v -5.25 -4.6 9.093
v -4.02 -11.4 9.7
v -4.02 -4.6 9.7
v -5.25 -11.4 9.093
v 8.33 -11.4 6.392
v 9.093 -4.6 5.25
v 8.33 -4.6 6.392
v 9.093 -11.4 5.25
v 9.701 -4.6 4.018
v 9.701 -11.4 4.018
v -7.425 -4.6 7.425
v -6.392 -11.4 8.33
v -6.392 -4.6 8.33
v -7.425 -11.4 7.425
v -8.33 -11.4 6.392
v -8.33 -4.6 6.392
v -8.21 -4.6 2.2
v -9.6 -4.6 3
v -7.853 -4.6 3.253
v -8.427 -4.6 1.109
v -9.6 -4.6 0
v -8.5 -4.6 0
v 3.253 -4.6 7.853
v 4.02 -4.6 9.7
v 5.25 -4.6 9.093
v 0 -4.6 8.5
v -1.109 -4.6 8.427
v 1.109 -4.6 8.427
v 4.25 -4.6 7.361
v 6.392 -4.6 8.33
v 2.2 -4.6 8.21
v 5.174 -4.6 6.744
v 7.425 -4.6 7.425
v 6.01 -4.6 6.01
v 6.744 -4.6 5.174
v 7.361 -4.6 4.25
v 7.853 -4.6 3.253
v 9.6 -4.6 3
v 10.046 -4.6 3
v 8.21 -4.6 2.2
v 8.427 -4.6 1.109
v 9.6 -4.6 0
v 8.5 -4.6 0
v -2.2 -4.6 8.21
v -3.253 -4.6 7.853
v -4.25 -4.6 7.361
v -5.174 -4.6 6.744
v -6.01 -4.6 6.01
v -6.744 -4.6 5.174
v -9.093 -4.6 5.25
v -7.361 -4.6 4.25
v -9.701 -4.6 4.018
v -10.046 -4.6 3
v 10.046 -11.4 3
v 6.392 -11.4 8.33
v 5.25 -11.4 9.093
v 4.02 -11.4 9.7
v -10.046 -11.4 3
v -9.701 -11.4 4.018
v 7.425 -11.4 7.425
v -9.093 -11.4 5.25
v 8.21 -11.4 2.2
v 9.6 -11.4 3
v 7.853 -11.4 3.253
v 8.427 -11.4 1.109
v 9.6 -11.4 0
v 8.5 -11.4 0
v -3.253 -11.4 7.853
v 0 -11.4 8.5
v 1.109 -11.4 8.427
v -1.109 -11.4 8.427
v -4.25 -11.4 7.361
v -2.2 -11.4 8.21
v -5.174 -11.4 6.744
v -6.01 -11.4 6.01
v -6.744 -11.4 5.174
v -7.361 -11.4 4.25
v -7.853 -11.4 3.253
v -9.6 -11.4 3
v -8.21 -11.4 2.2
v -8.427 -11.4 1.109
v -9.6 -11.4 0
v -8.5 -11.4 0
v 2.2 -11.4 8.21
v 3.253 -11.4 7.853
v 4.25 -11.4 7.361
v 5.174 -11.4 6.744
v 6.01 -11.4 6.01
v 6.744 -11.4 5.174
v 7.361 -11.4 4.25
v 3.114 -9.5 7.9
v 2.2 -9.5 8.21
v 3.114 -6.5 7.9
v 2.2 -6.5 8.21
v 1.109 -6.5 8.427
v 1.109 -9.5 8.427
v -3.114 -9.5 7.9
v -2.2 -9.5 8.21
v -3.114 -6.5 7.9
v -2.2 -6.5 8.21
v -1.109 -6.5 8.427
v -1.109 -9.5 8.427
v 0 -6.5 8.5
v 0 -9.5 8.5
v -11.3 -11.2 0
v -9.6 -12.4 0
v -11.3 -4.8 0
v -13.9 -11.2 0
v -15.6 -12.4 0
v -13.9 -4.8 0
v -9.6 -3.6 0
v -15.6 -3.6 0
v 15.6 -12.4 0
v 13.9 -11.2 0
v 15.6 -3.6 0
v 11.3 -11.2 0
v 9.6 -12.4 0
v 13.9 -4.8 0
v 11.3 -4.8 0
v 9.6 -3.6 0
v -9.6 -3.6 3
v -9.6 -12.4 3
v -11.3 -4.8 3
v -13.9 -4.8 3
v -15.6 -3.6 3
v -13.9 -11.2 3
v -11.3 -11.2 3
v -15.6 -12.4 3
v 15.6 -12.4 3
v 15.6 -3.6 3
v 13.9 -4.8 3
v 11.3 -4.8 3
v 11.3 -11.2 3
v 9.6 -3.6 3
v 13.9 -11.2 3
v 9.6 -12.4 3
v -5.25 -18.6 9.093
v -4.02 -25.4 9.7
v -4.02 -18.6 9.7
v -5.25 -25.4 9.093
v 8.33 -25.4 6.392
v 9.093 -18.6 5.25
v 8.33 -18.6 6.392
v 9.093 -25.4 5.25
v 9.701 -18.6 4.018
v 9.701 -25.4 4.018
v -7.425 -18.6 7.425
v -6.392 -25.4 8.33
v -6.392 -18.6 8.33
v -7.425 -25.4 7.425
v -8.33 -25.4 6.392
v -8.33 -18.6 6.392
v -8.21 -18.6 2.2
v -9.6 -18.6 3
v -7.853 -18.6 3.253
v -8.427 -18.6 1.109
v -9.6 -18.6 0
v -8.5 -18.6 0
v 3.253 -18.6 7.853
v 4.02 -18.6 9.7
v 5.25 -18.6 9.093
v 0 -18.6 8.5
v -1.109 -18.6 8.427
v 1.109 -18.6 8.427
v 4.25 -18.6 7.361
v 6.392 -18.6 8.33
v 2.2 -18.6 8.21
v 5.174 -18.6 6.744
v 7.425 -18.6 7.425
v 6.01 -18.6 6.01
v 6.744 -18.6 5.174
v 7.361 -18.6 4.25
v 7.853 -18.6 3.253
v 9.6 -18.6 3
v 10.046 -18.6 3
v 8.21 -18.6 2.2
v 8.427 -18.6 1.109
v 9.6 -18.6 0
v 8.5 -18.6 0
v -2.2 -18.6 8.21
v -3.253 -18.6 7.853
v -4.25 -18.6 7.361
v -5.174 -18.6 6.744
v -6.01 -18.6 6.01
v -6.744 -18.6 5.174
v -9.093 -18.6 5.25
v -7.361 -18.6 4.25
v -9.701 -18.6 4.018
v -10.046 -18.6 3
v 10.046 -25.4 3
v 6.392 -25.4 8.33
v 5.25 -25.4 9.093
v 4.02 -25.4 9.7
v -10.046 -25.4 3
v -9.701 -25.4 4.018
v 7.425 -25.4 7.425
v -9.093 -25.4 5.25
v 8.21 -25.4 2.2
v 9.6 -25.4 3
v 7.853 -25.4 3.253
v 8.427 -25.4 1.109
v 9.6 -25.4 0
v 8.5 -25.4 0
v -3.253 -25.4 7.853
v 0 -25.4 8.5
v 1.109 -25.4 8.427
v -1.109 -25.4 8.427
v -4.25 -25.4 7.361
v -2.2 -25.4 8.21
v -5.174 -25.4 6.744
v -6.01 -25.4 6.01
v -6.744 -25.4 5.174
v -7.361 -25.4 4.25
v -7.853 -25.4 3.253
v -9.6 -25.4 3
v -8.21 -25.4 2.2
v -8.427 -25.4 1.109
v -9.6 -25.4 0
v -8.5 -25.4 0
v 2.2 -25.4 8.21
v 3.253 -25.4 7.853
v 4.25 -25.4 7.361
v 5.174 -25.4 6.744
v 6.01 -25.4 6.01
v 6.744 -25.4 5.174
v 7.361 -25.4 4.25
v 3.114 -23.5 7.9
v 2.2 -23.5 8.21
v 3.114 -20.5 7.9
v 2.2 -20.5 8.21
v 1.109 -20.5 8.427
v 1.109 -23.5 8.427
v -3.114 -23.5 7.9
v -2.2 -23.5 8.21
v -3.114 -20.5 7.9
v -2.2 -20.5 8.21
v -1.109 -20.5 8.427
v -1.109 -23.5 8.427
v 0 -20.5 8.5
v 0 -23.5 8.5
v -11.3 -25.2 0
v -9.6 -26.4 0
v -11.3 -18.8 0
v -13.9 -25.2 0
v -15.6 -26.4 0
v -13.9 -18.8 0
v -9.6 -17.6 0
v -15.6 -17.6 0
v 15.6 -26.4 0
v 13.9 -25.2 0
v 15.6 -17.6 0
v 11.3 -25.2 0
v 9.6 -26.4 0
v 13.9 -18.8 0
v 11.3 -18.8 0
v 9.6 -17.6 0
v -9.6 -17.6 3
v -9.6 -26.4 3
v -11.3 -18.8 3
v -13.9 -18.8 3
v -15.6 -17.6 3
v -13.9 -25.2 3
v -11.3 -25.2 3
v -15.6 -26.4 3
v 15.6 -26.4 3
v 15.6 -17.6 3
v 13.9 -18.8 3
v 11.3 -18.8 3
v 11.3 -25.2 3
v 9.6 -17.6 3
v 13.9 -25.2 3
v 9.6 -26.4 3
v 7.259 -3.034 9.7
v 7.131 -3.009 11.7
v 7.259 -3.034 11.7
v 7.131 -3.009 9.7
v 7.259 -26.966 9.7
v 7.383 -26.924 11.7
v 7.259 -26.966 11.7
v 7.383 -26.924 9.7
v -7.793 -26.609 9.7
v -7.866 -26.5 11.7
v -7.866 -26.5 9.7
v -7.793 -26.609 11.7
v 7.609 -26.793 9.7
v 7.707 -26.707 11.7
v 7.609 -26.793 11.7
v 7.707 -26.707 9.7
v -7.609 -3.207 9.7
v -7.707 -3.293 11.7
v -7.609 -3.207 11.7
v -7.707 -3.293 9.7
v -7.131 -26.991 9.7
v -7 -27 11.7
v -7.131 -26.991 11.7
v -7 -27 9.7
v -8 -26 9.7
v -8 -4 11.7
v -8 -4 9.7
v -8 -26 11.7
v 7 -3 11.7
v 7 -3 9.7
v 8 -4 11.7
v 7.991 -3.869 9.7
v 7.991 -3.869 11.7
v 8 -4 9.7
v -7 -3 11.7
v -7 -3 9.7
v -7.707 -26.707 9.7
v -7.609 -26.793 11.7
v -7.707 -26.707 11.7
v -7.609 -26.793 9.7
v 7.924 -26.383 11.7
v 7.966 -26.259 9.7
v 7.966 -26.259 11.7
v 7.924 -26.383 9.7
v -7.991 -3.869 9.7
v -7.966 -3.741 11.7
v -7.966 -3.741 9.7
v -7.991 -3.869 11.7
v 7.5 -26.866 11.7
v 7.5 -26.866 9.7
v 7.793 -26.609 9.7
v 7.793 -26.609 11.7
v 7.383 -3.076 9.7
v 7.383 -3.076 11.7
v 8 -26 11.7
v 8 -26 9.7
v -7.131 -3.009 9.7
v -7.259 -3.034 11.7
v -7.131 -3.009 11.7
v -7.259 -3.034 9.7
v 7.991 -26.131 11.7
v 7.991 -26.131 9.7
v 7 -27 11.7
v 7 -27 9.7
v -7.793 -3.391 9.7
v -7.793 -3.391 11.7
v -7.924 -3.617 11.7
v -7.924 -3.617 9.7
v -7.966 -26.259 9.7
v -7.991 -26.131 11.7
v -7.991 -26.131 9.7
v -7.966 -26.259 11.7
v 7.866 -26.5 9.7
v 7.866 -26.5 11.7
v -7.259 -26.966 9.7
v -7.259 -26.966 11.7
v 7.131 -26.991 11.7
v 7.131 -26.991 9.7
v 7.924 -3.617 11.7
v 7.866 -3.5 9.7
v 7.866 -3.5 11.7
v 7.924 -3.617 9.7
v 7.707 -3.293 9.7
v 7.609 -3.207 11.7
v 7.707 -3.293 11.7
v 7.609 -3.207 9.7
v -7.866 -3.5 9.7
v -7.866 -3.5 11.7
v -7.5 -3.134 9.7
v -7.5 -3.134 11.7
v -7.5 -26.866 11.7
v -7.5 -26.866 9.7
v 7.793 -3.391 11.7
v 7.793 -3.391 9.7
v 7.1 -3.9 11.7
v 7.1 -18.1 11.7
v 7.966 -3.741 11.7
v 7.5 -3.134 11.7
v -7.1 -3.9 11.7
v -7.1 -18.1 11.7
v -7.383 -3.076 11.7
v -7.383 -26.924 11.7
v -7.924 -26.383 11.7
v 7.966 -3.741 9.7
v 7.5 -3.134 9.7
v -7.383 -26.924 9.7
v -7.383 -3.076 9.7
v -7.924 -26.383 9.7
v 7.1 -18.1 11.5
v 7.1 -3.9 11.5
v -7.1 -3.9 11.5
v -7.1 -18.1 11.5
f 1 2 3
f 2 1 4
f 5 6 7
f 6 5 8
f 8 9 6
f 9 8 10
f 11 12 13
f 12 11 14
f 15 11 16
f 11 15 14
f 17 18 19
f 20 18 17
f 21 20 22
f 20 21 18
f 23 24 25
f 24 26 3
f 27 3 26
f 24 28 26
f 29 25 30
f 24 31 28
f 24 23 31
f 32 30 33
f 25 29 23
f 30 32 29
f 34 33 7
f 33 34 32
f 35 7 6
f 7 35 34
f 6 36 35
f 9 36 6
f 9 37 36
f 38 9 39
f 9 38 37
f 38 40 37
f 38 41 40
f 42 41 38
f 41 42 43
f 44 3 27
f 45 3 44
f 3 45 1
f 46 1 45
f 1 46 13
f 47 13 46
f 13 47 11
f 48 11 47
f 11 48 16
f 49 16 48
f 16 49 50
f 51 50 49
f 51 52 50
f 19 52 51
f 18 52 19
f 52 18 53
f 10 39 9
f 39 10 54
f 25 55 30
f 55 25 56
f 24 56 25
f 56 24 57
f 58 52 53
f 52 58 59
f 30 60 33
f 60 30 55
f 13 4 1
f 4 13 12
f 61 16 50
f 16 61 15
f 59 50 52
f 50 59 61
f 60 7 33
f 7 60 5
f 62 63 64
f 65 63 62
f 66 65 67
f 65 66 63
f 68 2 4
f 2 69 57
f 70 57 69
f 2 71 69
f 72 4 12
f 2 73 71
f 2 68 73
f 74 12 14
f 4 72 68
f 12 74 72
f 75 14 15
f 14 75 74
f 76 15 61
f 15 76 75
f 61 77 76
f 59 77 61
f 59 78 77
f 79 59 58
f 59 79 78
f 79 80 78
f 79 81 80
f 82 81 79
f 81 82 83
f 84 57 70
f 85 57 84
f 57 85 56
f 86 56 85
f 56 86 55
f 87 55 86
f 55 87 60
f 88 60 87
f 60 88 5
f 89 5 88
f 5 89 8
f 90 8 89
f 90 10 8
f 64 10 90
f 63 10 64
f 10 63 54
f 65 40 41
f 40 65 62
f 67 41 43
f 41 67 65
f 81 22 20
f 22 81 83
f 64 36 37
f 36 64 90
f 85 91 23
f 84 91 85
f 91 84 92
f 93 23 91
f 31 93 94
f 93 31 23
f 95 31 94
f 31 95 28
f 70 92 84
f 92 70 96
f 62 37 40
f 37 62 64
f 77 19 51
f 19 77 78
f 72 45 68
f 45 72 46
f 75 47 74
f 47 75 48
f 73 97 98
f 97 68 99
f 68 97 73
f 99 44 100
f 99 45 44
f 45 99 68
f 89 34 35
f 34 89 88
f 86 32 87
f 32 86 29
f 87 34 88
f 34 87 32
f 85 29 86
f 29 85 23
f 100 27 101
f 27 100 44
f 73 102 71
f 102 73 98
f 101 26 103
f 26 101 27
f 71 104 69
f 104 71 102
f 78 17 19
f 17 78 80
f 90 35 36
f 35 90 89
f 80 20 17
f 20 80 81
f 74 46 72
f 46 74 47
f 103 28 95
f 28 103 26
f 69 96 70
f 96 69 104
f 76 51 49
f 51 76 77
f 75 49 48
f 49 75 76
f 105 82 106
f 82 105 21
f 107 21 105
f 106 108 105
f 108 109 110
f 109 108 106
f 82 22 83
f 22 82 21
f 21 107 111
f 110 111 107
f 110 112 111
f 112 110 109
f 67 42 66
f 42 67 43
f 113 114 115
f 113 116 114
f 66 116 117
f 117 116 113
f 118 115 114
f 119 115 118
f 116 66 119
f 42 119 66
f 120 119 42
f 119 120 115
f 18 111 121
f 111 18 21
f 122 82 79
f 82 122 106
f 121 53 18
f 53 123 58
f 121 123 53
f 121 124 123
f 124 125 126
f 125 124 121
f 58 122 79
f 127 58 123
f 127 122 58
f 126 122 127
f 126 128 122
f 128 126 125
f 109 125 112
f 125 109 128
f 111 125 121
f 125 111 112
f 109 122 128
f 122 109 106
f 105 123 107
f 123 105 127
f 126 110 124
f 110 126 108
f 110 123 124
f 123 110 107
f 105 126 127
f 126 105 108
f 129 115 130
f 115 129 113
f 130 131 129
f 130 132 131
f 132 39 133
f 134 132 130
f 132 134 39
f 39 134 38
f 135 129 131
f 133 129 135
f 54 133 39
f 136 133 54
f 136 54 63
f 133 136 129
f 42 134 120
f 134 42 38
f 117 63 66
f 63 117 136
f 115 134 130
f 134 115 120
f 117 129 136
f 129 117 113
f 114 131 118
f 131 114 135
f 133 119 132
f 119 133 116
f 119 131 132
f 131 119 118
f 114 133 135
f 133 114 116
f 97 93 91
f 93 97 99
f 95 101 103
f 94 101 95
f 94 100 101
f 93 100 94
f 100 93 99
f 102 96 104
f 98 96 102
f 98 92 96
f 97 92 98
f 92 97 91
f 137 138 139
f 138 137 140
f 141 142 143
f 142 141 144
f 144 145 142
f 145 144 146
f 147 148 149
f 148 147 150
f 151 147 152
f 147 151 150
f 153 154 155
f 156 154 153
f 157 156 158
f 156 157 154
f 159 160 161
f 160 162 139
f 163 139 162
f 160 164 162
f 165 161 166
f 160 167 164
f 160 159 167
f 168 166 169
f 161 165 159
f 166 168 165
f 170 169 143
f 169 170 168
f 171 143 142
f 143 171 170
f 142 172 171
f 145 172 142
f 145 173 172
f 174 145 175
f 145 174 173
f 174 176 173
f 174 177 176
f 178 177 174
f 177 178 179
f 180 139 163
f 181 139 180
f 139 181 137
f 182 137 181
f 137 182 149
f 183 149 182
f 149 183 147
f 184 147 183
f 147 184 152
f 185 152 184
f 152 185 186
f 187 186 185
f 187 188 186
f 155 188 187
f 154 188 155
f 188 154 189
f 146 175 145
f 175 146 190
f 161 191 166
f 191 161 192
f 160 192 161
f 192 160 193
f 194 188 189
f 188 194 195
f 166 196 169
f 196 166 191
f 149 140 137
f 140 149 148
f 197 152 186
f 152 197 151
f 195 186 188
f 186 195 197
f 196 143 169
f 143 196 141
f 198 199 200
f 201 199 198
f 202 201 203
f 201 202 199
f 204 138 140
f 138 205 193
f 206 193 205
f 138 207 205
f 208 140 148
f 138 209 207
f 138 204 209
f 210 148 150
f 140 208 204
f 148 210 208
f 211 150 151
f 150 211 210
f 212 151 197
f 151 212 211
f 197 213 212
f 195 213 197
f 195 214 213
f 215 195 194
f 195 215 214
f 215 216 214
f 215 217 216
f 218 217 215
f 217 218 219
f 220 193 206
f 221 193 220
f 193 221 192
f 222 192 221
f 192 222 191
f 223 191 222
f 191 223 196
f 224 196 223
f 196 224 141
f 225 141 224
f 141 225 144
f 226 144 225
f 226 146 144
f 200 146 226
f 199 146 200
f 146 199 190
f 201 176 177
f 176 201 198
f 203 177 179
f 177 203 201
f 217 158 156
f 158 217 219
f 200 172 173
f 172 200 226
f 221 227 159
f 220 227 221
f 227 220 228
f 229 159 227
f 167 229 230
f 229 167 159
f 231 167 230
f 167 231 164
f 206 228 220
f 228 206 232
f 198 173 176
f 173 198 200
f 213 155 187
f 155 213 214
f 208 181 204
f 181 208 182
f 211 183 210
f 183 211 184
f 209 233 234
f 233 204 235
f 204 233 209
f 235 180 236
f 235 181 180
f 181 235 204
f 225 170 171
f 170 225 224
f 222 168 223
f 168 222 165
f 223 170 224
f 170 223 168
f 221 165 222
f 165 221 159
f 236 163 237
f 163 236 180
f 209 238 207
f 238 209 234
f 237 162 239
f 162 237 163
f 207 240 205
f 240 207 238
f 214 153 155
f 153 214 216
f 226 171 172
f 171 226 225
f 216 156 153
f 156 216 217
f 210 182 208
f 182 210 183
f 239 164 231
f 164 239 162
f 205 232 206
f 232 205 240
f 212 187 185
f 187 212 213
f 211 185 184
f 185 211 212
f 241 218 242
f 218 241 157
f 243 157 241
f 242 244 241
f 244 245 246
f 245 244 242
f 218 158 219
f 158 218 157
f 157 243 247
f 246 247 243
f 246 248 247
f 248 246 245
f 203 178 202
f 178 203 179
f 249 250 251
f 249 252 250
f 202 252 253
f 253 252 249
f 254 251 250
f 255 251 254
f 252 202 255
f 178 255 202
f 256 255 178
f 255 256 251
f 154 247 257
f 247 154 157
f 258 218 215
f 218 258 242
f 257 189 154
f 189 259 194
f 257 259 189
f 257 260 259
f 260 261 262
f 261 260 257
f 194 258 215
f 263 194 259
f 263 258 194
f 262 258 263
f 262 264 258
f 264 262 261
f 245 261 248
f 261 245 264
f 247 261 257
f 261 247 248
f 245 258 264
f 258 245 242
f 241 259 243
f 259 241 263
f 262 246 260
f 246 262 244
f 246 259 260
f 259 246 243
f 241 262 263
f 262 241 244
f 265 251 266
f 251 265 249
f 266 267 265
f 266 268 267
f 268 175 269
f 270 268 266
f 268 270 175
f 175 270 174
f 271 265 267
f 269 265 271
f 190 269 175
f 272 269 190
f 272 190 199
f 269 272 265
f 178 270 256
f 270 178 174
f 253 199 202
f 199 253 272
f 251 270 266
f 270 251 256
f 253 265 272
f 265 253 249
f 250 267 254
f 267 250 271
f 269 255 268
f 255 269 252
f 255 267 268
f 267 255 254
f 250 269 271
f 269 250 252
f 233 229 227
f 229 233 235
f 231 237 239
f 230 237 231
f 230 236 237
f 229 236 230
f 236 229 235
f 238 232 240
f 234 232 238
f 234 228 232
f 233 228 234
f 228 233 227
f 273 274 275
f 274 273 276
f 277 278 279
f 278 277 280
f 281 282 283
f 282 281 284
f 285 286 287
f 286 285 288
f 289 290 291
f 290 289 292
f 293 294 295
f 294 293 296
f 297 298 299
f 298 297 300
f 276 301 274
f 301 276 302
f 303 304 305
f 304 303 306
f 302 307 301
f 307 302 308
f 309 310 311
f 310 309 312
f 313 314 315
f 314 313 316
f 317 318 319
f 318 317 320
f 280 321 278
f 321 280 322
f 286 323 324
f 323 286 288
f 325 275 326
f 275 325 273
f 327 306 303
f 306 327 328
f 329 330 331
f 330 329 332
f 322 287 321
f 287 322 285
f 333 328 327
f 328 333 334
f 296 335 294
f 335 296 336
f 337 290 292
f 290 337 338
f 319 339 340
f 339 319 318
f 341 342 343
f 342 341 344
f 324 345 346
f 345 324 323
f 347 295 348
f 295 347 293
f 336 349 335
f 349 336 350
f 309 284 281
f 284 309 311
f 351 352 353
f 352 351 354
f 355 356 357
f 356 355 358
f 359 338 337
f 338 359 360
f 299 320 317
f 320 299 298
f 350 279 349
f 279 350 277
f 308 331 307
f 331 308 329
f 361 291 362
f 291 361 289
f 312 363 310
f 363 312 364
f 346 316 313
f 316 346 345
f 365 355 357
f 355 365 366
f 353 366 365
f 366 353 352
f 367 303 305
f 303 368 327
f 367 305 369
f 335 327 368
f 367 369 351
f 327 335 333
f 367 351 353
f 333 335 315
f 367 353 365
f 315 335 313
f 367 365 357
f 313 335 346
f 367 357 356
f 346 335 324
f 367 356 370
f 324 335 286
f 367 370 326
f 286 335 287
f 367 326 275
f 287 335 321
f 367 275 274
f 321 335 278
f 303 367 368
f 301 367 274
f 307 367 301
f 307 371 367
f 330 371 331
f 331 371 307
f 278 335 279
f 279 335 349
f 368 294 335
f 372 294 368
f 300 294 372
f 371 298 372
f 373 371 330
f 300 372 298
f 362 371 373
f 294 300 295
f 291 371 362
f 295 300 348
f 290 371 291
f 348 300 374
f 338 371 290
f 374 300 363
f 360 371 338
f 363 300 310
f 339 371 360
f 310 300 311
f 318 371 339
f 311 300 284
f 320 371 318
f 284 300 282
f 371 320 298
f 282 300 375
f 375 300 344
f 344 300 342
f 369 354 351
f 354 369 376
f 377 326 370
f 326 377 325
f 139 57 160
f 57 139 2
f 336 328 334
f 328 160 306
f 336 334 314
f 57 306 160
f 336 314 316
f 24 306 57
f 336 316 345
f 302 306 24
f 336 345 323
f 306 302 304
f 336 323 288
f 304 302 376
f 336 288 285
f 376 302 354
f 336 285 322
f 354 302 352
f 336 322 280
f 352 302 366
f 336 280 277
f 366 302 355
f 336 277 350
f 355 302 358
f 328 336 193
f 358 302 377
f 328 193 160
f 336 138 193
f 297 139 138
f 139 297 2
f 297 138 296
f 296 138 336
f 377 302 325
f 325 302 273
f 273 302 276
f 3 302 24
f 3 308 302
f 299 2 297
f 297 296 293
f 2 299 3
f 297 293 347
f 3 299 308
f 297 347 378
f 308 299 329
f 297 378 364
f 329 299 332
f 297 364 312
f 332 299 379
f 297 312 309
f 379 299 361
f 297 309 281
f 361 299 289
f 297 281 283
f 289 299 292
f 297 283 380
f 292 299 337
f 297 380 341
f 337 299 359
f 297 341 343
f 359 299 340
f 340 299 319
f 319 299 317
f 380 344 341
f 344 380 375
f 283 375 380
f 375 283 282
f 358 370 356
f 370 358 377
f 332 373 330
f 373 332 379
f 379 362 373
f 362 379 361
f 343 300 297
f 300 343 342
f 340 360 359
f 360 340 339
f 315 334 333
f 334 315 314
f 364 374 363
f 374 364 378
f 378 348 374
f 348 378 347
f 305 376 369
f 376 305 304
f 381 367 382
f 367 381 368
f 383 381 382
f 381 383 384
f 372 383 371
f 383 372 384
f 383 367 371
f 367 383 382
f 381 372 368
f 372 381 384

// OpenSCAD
// ReachSense six-finger wrap v2. Units: mm. Experimental, physically unverified.
// R: +X lateral, +Y distal (towards fingertip), +Z dorsal.
// A REMOVABLE seating gauge defines Y=0. The wearable deck ends at Y=-3.
// Remove the gauge before testing; no permanent wall blocks the fingertip.
// This defines nominal longitudinal registration, NOT an anatomical 3D point.
$fn = 48;
part = "holder"; // "holder", "gauge" or "strap"
marker_id = 22;
finger_diameter_mm = 17;
marker_edge_mm = 10;
quiet_zone_mm = 2;
frame_mm = 1;
wall_mm = 2;
stop_wall_mm = 1.2;
strap_width_mm = 6;
strap_length_mm = 90;
gauge_side_clearance_mm = 0.3;
r = finger_diameter_mm/2;
tile = marker_edge_mm + 2*quiet_zone_mm;
deck_width = tile + 2*frame_mm;
length = tile + 2*frame_mm + 8;
deck_front_y = -3;
deck_back_y = deck_front_y-length;
deck_bottom = r + wall_mm - 0.8;
deck_top = deck_bottom + 2;
pocket_depth = 0.2;
marker_y = deck_front_y-(frame_mm+quiet_zone_mm+marker_edge_mm/2);
support_y = [deck_front_y-5,deck_back_y+5];
nail_seat_width = min(8,finger_diameter_mm/2);
nail_seat_z = r-0.6;
assert(finger_diameter_mm >= 12 && finger_diameter_mm <= 26,"Choose a 12–26 mm candidate opening");
assert(marker_edge_mm >= 8 && marker_edge_mm <= 16,"Choose an 8–16 mm black edge");
assert(quiet_zone_mm >= 2,"Keep the full white quiet zone");
assert(marker_id >= 0 && marker_id < 100,"DICT_4X4_100 ID required");
module support(y) {
    translate([0,y,0]) intersection() {
        difference() {
            rotate([90,0,0]) cylinder(r=r+wall_mm,h=6.8,center=true);
            rotate([90,0,0]) cylinder(r=r,h=8.8,center=true);
        }
        translate([-r-wall_mm-1,-4.4,0]) cube([2*(r+wall_mm+1),8.8,r+wall_mm+1]);
    }
    // Flat dorsal bearing at each strap region closes the gap below the deck.
    // Contact with a real nail/dorsal surface and rotational retention are unverified.
    translate([-nail_seat_width/2,y-1.5,nail_seat_z])
        cube([nail_seat_width,3,deck_bottom-nail_seat_z+0.2]);
    for(sign=[-1,1]) translate([sign*(r+wall_mm+2.1),y,1.5]) difference() {
        cube([6,8.8,3],center=true);
        cube([2.6,6.4,5],center=true);
    }
}
module deck() {
    // Rounded corners retain a straight central gauge abutment at Y=-3.
    hull() for(x=[-deck_width/2+1,deck_width/2-1])
        for(y=[deck_back_y+1,deck_front_y-1])
            translate([x,y,deck_bottom]) cylinder(r=1,h=2);
}
module holder() {
    difference() {
        union() { for(y=support_y) support(y); deck(); }
        translate([-tile/2-0.1,marker_y-tile/2-0.1,deck_top-pocket_depth])
            cube([tile+0.2,tile+0.2,pocket_depth+1]);
    }
}
module gauge() {
    // Hand-held drop-on gauge, NOT a validated snap fit. Hold its proximal
    // abutment against the deck's front face at Y=-3 while gently seating the finger.
    // Feet sit on the bare side frame; the ArUco pocket remains clear.
    union() {
        translate([-deck_width/2-2.3,deck_front_y,deck_top])
            cube([deck_width+4.6,-deck_front_y+stop_wall_mm,1.2]);
        // Deck contact Y=-3; fingertip contact Y=0. Remove upwards after tightening.
        translate([-deck_width/2+1,deck_front_y,deck_bottom])
            cube([deck_width-2,-deck_front_y,deck_top-deck_bottom+0.5]);
        translate([-deck_width/2,0,-r/2])
            cube([deck_width,stop_wall_mm,deck_top+1.2+r/2]);
        for(sign=[-1,1]) {
            x=sign>0 ? deck_width/2+gauge_side_clearance_mm : -deck_width/2-gauge_side_clearance_mm-2;
            translate([x,-10,deck_bottom]) cube([2,10,deck_top-deck_bottom+1.2]);
            foot_x=sign>0 ? deck_width/2-0.8 : -deck_width/2-2.3;
            translate([foot_x,-10,deck_top]) cube([3.1,10,1.2]);
        }
    }
}
module strap() {
    // TPU-only ladder strip. Ends require a return loop/fastener or hook-and-loop.
    union() {
        translate([-strap_length_mm/2,-strap_width_mm/2,0]) cube([strap_length_mm,strap_width_mm,0.8]);
        for(x=[-strap_length_mm/2+3:4:strap_length_mm/2-3])
            translate([x-0.7,-strap_width_mm/2,0.8]) cube([1.4,strap_width_mm,0.5]);
    }
}
if(part=="strap") strap(); else if(part=="gauge") gauge(); else holder();
echo(reference_plane_y_mm=0,deck_front_y_mm=deck_front_y);
echo(marker_center_R_mm=[0,marker_y,deck_top-pocket_depth+0.15]);
echo(marker_center_to_reference_plane_mm=-marker_y);
